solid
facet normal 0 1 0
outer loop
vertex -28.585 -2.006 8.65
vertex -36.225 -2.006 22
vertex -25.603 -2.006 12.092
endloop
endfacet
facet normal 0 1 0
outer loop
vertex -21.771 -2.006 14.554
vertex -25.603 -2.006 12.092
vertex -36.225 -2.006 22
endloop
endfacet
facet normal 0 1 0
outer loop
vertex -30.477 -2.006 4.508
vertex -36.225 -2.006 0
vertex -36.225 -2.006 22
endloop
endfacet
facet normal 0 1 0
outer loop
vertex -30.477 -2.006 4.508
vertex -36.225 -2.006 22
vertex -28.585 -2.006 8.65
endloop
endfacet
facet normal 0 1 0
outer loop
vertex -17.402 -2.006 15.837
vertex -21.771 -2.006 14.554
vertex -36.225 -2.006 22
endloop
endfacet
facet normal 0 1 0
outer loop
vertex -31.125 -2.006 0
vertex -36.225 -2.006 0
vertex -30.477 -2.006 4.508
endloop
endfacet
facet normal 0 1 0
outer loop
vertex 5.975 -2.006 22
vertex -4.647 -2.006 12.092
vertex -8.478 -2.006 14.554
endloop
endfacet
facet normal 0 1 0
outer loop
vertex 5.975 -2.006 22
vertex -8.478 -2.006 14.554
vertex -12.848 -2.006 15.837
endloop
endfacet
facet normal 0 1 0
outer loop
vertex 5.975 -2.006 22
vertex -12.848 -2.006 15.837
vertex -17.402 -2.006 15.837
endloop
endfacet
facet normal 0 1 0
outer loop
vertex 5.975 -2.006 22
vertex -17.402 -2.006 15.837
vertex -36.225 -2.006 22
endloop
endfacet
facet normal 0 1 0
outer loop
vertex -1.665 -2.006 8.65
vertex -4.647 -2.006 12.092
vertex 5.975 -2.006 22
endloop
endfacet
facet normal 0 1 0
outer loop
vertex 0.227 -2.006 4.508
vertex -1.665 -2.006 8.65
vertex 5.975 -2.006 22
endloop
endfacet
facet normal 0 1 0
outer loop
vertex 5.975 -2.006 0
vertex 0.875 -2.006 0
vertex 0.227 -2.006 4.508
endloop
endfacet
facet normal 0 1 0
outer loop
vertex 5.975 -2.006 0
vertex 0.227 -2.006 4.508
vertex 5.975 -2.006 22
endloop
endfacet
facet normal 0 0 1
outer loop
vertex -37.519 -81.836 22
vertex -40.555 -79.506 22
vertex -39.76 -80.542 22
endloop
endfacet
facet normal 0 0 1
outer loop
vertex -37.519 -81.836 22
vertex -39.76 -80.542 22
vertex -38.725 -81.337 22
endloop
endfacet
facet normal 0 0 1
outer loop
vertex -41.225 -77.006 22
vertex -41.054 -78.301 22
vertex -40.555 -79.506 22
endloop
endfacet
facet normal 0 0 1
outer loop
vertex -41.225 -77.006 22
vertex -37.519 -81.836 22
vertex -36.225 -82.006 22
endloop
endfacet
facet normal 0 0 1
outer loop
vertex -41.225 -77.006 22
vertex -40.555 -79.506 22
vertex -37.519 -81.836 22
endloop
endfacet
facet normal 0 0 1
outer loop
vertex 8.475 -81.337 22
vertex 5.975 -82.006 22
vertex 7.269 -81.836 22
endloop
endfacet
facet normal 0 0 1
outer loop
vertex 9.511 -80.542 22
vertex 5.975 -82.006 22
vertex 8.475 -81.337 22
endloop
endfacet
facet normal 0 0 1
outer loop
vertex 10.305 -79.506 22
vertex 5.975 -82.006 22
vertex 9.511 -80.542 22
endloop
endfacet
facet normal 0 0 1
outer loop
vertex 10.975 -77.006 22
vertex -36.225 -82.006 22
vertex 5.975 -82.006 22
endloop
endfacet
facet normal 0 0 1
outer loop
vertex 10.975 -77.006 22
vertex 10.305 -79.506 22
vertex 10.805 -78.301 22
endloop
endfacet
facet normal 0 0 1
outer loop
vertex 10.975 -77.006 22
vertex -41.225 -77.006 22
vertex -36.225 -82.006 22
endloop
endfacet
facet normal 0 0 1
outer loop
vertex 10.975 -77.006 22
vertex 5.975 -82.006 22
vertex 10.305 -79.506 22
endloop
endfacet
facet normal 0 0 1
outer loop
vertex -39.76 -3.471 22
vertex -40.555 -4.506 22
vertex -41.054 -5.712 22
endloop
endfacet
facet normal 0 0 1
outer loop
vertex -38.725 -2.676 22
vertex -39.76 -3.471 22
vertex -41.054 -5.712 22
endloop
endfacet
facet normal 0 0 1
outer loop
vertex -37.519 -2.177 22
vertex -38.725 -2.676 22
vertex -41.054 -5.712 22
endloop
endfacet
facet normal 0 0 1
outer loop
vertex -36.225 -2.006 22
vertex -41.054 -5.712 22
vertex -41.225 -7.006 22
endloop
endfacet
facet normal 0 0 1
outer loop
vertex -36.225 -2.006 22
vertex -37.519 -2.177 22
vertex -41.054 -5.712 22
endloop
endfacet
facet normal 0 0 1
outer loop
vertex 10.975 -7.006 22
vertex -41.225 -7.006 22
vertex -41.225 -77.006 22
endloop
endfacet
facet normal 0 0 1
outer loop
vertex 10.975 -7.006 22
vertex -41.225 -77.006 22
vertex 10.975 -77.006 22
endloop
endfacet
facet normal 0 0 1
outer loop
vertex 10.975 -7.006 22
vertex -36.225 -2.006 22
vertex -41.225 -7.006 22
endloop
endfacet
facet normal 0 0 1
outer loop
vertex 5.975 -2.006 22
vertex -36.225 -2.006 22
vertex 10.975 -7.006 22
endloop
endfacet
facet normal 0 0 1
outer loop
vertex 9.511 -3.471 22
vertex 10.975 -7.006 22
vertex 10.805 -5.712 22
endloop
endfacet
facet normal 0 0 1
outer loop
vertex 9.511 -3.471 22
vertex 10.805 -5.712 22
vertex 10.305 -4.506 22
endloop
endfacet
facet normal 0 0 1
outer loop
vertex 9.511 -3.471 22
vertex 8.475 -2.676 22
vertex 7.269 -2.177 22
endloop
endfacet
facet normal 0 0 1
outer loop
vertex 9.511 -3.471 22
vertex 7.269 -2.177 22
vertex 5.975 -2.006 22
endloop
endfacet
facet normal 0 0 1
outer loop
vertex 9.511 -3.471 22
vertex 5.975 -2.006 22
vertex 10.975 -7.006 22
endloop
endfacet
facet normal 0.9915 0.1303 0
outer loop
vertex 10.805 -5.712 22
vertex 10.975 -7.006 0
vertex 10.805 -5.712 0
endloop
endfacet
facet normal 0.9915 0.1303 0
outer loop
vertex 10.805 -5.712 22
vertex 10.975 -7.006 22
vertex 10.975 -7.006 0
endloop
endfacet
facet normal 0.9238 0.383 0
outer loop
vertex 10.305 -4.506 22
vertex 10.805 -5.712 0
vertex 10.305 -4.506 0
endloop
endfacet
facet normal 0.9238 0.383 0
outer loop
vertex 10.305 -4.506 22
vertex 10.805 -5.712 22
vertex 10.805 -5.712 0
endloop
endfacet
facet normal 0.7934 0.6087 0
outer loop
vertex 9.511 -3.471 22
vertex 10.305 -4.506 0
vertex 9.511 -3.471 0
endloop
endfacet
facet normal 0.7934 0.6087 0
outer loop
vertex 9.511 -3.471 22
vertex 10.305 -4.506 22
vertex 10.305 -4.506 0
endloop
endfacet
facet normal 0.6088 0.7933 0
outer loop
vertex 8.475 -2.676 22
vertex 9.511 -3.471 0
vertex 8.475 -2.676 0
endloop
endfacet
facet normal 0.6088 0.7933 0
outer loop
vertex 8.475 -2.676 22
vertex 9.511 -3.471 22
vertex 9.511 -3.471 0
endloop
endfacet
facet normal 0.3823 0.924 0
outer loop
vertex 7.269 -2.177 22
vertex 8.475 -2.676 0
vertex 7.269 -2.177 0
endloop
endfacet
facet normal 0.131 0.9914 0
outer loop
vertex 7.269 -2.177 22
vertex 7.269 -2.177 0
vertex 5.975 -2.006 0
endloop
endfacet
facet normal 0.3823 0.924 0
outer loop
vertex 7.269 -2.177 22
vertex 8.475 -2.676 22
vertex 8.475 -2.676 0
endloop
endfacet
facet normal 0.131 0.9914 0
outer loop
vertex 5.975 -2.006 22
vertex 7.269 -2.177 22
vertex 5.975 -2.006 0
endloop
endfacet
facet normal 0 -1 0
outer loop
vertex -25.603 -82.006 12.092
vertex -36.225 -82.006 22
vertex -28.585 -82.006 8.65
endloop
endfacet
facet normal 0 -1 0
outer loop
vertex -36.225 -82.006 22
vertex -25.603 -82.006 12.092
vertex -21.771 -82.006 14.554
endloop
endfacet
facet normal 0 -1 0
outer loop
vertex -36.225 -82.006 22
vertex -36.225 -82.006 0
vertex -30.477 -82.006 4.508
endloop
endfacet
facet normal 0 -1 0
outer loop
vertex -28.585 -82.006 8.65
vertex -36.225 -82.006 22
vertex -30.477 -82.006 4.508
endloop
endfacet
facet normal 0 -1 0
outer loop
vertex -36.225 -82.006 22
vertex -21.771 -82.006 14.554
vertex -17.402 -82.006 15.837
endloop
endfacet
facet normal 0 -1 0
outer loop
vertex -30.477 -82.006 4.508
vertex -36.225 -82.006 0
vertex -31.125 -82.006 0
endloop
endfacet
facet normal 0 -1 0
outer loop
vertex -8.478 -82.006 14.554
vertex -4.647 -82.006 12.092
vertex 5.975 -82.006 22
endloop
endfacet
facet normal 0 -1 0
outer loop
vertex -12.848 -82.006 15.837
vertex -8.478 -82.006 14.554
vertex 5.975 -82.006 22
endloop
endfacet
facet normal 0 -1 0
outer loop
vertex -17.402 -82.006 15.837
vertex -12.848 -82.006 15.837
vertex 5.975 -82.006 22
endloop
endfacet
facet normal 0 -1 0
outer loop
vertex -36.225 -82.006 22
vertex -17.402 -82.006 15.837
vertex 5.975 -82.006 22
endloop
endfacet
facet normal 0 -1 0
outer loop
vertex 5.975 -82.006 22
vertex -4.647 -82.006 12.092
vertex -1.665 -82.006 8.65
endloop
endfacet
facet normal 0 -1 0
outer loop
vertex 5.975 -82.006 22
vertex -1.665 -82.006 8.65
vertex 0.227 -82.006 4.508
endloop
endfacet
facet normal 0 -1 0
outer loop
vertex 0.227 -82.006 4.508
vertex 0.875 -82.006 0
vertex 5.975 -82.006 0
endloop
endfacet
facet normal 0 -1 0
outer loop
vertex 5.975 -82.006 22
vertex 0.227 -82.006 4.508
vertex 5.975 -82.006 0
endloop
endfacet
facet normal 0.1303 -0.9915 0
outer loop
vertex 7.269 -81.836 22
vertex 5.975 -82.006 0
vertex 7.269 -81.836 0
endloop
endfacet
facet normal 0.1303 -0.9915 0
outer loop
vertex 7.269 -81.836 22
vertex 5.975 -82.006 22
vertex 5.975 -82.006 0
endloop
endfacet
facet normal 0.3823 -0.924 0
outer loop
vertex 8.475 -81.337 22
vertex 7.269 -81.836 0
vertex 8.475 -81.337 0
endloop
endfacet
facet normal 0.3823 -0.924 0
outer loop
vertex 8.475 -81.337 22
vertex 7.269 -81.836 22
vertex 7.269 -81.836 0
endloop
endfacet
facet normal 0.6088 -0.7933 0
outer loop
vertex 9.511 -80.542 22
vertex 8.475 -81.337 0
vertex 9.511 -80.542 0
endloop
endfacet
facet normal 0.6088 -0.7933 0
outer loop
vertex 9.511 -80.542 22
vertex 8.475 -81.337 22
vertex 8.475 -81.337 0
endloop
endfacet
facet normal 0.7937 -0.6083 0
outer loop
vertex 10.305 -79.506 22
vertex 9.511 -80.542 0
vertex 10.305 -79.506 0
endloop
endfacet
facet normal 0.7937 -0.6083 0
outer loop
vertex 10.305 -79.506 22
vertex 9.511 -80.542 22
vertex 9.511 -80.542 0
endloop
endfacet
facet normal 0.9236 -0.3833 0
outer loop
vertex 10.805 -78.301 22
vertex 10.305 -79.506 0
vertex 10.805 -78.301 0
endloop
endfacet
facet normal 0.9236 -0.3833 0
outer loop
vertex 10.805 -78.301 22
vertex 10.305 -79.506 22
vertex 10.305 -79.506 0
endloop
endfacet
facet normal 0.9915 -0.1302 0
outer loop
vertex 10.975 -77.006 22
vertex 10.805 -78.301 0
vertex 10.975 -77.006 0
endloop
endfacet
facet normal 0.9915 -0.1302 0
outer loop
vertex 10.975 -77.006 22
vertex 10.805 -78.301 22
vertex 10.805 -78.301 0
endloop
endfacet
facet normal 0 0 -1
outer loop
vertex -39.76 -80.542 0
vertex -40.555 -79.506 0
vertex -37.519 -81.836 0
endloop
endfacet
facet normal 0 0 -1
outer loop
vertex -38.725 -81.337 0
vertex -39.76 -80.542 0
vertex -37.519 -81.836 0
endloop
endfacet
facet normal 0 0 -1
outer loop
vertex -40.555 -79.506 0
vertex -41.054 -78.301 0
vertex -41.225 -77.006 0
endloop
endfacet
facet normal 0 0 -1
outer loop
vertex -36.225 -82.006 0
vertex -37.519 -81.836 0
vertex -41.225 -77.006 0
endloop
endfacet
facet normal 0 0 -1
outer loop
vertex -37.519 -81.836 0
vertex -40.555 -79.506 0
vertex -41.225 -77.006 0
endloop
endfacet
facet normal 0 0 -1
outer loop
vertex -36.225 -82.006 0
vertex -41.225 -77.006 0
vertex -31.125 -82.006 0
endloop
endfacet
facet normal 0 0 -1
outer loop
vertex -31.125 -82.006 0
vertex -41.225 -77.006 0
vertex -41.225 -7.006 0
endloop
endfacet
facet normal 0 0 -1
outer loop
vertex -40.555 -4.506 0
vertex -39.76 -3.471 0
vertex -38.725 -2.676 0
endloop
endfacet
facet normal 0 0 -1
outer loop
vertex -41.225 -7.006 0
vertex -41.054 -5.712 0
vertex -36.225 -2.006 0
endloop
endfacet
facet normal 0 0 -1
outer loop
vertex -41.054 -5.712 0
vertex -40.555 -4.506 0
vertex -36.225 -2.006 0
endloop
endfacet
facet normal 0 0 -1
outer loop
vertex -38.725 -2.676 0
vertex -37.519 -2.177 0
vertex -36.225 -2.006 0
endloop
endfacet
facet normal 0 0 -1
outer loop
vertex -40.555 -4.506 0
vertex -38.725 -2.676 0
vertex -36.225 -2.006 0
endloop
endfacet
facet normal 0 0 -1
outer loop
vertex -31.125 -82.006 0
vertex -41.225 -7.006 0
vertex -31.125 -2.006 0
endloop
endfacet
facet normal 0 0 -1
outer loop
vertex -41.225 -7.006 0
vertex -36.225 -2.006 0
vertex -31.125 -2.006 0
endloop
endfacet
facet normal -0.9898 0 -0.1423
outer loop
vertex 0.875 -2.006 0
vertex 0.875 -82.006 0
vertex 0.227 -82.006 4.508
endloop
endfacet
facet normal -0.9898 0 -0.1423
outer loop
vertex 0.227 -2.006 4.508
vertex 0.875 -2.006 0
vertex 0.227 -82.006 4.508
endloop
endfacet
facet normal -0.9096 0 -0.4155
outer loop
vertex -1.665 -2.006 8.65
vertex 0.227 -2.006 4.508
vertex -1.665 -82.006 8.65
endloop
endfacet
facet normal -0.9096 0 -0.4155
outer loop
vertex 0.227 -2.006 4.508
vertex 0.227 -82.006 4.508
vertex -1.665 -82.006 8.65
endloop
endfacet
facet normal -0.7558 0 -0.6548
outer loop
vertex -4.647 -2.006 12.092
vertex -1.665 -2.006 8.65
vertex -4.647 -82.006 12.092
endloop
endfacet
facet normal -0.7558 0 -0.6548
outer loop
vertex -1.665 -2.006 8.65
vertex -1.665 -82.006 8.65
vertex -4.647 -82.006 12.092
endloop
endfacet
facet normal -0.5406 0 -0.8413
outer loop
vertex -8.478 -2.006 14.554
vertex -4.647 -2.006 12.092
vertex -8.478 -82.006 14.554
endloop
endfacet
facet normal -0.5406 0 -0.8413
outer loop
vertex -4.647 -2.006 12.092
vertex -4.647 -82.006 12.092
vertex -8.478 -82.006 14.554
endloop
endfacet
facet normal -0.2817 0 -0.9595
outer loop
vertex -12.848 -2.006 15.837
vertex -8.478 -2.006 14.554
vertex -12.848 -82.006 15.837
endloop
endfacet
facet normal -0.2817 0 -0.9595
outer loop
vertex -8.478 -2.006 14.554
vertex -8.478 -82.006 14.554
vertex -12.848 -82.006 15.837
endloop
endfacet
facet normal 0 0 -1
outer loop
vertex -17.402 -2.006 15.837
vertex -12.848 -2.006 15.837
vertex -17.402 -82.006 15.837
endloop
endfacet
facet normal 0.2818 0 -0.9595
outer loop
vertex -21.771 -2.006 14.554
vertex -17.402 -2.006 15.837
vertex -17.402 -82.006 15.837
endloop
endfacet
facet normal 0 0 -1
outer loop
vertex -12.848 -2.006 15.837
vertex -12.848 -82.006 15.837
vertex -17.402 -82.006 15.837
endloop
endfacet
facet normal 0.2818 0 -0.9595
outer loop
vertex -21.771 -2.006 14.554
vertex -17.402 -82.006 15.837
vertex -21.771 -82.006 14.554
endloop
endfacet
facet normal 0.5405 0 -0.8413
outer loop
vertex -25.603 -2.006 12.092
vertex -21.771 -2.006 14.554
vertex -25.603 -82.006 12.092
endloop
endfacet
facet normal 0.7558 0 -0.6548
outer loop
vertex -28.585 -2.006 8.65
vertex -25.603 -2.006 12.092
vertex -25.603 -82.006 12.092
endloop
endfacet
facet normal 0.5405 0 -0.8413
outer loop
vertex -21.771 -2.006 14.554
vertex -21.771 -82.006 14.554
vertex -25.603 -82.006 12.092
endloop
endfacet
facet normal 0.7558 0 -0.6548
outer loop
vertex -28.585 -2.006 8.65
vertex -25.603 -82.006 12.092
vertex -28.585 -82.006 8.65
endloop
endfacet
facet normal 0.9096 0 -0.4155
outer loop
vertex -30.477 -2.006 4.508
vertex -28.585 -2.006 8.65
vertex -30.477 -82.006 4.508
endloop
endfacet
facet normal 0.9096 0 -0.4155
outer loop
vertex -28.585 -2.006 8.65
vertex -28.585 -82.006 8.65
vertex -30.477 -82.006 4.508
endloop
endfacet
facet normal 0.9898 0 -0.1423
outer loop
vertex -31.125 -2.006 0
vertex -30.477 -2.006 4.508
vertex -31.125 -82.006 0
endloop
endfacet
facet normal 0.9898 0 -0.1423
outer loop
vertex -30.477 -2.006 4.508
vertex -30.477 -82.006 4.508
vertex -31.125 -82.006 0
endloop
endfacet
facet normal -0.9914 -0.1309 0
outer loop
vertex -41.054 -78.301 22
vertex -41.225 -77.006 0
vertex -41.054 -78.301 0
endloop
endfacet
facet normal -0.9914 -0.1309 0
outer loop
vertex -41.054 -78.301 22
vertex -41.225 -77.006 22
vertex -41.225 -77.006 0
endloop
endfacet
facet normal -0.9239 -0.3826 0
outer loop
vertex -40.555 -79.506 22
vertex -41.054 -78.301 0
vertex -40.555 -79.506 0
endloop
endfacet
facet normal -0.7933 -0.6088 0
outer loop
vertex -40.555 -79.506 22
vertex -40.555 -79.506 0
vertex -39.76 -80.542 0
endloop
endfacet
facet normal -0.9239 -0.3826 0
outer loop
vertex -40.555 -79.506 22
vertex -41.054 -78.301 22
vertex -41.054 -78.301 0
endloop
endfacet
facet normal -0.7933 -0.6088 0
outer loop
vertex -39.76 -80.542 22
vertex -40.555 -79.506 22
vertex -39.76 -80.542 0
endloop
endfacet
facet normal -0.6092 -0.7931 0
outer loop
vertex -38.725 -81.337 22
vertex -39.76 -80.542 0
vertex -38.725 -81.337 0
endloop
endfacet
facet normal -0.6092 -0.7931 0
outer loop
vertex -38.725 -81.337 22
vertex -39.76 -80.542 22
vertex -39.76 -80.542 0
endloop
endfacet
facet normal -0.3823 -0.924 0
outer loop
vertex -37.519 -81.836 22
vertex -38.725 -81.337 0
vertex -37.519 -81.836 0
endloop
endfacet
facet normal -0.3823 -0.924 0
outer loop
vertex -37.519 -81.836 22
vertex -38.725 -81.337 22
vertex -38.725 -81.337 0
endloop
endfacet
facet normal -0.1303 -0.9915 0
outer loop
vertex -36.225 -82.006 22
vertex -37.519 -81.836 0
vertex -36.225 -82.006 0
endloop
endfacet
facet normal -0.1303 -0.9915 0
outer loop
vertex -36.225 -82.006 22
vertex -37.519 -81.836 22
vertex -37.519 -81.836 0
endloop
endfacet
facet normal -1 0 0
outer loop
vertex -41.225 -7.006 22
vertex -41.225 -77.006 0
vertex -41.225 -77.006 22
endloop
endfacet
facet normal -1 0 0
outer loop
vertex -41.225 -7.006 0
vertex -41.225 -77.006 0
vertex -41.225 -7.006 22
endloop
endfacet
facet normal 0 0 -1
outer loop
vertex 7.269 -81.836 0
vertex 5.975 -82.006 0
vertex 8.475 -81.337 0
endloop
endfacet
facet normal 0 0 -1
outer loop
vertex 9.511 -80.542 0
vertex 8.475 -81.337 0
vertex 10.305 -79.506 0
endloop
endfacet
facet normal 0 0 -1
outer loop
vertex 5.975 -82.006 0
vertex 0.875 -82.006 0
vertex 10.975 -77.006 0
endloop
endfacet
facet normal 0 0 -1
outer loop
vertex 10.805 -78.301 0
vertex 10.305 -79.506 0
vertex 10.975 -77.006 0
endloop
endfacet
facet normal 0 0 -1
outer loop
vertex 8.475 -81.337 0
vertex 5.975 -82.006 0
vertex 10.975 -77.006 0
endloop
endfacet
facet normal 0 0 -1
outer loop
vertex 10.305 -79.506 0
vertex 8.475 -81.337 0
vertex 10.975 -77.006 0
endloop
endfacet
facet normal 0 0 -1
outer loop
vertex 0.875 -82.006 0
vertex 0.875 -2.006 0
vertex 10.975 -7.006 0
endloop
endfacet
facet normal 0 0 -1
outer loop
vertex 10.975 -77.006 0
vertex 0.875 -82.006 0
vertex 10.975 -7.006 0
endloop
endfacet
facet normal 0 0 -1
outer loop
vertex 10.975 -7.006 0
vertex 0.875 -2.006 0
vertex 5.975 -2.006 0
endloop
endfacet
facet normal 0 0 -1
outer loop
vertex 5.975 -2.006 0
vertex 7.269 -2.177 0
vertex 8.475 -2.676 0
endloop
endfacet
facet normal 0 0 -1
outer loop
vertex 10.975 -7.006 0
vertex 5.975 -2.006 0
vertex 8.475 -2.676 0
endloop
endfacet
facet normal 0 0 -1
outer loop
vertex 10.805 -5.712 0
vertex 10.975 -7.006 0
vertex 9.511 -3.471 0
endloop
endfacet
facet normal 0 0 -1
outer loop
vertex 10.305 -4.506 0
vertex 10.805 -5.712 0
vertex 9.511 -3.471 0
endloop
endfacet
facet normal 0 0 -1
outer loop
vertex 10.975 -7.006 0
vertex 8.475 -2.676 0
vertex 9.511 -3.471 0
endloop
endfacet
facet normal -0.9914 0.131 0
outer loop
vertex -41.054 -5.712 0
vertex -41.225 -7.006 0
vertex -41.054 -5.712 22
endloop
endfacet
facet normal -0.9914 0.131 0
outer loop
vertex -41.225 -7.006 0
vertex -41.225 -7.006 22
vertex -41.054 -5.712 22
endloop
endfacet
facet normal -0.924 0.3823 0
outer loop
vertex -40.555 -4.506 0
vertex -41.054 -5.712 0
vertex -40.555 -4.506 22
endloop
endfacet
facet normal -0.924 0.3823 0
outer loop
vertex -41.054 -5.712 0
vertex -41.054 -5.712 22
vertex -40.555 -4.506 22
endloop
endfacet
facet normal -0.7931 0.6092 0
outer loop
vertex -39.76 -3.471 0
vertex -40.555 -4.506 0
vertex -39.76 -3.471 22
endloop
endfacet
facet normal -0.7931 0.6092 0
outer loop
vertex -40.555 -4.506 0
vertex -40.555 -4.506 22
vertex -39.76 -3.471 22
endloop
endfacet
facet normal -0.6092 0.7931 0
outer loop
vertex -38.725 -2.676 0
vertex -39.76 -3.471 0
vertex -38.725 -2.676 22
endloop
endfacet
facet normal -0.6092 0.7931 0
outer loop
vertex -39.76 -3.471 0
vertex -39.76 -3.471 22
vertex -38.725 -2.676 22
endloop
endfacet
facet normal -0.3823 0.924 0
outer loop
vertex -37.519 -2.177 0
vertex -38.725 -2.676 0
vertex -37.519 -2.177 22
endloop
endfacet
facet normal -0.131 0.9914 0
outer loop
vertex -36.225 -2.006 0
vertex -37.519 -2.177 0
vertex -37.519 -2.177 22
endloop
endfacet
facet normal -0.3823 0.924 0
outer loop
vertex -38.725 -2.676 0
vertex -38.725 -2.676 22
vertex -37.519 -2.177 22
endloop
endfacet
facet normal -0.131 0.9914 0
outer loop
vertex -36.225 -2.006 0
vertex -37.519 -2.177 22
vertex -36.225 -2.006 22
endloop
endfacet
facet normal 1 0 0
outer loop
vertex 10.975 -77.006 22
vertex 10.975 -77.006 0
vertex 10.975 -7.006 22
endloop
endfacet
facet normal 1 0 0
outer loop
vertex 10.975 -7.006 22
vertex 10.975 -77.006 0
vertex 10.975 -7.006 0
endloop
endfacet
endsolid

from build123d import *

# Parameters (mm, degrees)
ESQUISSE1_W             = 52.2
ESQUISSE1_H             = 80
BOSS_EXTRU_2_DEPTH      = 22
CONG_2_R                = 5
ESQUISSE2_R             = 16
ENL_V_MAT_EXTRU_3_DEPTH = 93.647092521


with BuildPart() as part:
    # Esquisse1 → Boss.-Extru.2 (new body)
    with BuildSketch(Plane.XY):
        with Locations((-15.124795362, -42.006460905)):
            Rectangle(ESQUISSE1_W, ESQUISSE1_H)
    extrude(amount=BOSS_EXTRU_2_DEPTH)

    # Congé2
    cong_2_edges = [part.edges().sort_by_distance(p)[0] for p in [
        (-41.224795362, -2.006460905, 11),
        (10.975204638, -2.006460905, 11),
        (10.975204638, -82.006460905, 11),
        (-41.224795362, -82.006460905, 11),
    ]]
    fillet(cong_2_edges, radius=CONG_2_R)

    # Esquisse2 → Enlèv. mat.-Extru.3 (cut, through all)
    with BuildSketch(Plane.XZ.offset(82.006460905)):
        with Locations((-15.124795362, 0)):
            Circle(ESQUISSE2_R)
    extrude(amount=-ENL_V_MAT_EXTRU_3_DEPTH, mode=Mode.SUBTRACT)


solid = part.part
